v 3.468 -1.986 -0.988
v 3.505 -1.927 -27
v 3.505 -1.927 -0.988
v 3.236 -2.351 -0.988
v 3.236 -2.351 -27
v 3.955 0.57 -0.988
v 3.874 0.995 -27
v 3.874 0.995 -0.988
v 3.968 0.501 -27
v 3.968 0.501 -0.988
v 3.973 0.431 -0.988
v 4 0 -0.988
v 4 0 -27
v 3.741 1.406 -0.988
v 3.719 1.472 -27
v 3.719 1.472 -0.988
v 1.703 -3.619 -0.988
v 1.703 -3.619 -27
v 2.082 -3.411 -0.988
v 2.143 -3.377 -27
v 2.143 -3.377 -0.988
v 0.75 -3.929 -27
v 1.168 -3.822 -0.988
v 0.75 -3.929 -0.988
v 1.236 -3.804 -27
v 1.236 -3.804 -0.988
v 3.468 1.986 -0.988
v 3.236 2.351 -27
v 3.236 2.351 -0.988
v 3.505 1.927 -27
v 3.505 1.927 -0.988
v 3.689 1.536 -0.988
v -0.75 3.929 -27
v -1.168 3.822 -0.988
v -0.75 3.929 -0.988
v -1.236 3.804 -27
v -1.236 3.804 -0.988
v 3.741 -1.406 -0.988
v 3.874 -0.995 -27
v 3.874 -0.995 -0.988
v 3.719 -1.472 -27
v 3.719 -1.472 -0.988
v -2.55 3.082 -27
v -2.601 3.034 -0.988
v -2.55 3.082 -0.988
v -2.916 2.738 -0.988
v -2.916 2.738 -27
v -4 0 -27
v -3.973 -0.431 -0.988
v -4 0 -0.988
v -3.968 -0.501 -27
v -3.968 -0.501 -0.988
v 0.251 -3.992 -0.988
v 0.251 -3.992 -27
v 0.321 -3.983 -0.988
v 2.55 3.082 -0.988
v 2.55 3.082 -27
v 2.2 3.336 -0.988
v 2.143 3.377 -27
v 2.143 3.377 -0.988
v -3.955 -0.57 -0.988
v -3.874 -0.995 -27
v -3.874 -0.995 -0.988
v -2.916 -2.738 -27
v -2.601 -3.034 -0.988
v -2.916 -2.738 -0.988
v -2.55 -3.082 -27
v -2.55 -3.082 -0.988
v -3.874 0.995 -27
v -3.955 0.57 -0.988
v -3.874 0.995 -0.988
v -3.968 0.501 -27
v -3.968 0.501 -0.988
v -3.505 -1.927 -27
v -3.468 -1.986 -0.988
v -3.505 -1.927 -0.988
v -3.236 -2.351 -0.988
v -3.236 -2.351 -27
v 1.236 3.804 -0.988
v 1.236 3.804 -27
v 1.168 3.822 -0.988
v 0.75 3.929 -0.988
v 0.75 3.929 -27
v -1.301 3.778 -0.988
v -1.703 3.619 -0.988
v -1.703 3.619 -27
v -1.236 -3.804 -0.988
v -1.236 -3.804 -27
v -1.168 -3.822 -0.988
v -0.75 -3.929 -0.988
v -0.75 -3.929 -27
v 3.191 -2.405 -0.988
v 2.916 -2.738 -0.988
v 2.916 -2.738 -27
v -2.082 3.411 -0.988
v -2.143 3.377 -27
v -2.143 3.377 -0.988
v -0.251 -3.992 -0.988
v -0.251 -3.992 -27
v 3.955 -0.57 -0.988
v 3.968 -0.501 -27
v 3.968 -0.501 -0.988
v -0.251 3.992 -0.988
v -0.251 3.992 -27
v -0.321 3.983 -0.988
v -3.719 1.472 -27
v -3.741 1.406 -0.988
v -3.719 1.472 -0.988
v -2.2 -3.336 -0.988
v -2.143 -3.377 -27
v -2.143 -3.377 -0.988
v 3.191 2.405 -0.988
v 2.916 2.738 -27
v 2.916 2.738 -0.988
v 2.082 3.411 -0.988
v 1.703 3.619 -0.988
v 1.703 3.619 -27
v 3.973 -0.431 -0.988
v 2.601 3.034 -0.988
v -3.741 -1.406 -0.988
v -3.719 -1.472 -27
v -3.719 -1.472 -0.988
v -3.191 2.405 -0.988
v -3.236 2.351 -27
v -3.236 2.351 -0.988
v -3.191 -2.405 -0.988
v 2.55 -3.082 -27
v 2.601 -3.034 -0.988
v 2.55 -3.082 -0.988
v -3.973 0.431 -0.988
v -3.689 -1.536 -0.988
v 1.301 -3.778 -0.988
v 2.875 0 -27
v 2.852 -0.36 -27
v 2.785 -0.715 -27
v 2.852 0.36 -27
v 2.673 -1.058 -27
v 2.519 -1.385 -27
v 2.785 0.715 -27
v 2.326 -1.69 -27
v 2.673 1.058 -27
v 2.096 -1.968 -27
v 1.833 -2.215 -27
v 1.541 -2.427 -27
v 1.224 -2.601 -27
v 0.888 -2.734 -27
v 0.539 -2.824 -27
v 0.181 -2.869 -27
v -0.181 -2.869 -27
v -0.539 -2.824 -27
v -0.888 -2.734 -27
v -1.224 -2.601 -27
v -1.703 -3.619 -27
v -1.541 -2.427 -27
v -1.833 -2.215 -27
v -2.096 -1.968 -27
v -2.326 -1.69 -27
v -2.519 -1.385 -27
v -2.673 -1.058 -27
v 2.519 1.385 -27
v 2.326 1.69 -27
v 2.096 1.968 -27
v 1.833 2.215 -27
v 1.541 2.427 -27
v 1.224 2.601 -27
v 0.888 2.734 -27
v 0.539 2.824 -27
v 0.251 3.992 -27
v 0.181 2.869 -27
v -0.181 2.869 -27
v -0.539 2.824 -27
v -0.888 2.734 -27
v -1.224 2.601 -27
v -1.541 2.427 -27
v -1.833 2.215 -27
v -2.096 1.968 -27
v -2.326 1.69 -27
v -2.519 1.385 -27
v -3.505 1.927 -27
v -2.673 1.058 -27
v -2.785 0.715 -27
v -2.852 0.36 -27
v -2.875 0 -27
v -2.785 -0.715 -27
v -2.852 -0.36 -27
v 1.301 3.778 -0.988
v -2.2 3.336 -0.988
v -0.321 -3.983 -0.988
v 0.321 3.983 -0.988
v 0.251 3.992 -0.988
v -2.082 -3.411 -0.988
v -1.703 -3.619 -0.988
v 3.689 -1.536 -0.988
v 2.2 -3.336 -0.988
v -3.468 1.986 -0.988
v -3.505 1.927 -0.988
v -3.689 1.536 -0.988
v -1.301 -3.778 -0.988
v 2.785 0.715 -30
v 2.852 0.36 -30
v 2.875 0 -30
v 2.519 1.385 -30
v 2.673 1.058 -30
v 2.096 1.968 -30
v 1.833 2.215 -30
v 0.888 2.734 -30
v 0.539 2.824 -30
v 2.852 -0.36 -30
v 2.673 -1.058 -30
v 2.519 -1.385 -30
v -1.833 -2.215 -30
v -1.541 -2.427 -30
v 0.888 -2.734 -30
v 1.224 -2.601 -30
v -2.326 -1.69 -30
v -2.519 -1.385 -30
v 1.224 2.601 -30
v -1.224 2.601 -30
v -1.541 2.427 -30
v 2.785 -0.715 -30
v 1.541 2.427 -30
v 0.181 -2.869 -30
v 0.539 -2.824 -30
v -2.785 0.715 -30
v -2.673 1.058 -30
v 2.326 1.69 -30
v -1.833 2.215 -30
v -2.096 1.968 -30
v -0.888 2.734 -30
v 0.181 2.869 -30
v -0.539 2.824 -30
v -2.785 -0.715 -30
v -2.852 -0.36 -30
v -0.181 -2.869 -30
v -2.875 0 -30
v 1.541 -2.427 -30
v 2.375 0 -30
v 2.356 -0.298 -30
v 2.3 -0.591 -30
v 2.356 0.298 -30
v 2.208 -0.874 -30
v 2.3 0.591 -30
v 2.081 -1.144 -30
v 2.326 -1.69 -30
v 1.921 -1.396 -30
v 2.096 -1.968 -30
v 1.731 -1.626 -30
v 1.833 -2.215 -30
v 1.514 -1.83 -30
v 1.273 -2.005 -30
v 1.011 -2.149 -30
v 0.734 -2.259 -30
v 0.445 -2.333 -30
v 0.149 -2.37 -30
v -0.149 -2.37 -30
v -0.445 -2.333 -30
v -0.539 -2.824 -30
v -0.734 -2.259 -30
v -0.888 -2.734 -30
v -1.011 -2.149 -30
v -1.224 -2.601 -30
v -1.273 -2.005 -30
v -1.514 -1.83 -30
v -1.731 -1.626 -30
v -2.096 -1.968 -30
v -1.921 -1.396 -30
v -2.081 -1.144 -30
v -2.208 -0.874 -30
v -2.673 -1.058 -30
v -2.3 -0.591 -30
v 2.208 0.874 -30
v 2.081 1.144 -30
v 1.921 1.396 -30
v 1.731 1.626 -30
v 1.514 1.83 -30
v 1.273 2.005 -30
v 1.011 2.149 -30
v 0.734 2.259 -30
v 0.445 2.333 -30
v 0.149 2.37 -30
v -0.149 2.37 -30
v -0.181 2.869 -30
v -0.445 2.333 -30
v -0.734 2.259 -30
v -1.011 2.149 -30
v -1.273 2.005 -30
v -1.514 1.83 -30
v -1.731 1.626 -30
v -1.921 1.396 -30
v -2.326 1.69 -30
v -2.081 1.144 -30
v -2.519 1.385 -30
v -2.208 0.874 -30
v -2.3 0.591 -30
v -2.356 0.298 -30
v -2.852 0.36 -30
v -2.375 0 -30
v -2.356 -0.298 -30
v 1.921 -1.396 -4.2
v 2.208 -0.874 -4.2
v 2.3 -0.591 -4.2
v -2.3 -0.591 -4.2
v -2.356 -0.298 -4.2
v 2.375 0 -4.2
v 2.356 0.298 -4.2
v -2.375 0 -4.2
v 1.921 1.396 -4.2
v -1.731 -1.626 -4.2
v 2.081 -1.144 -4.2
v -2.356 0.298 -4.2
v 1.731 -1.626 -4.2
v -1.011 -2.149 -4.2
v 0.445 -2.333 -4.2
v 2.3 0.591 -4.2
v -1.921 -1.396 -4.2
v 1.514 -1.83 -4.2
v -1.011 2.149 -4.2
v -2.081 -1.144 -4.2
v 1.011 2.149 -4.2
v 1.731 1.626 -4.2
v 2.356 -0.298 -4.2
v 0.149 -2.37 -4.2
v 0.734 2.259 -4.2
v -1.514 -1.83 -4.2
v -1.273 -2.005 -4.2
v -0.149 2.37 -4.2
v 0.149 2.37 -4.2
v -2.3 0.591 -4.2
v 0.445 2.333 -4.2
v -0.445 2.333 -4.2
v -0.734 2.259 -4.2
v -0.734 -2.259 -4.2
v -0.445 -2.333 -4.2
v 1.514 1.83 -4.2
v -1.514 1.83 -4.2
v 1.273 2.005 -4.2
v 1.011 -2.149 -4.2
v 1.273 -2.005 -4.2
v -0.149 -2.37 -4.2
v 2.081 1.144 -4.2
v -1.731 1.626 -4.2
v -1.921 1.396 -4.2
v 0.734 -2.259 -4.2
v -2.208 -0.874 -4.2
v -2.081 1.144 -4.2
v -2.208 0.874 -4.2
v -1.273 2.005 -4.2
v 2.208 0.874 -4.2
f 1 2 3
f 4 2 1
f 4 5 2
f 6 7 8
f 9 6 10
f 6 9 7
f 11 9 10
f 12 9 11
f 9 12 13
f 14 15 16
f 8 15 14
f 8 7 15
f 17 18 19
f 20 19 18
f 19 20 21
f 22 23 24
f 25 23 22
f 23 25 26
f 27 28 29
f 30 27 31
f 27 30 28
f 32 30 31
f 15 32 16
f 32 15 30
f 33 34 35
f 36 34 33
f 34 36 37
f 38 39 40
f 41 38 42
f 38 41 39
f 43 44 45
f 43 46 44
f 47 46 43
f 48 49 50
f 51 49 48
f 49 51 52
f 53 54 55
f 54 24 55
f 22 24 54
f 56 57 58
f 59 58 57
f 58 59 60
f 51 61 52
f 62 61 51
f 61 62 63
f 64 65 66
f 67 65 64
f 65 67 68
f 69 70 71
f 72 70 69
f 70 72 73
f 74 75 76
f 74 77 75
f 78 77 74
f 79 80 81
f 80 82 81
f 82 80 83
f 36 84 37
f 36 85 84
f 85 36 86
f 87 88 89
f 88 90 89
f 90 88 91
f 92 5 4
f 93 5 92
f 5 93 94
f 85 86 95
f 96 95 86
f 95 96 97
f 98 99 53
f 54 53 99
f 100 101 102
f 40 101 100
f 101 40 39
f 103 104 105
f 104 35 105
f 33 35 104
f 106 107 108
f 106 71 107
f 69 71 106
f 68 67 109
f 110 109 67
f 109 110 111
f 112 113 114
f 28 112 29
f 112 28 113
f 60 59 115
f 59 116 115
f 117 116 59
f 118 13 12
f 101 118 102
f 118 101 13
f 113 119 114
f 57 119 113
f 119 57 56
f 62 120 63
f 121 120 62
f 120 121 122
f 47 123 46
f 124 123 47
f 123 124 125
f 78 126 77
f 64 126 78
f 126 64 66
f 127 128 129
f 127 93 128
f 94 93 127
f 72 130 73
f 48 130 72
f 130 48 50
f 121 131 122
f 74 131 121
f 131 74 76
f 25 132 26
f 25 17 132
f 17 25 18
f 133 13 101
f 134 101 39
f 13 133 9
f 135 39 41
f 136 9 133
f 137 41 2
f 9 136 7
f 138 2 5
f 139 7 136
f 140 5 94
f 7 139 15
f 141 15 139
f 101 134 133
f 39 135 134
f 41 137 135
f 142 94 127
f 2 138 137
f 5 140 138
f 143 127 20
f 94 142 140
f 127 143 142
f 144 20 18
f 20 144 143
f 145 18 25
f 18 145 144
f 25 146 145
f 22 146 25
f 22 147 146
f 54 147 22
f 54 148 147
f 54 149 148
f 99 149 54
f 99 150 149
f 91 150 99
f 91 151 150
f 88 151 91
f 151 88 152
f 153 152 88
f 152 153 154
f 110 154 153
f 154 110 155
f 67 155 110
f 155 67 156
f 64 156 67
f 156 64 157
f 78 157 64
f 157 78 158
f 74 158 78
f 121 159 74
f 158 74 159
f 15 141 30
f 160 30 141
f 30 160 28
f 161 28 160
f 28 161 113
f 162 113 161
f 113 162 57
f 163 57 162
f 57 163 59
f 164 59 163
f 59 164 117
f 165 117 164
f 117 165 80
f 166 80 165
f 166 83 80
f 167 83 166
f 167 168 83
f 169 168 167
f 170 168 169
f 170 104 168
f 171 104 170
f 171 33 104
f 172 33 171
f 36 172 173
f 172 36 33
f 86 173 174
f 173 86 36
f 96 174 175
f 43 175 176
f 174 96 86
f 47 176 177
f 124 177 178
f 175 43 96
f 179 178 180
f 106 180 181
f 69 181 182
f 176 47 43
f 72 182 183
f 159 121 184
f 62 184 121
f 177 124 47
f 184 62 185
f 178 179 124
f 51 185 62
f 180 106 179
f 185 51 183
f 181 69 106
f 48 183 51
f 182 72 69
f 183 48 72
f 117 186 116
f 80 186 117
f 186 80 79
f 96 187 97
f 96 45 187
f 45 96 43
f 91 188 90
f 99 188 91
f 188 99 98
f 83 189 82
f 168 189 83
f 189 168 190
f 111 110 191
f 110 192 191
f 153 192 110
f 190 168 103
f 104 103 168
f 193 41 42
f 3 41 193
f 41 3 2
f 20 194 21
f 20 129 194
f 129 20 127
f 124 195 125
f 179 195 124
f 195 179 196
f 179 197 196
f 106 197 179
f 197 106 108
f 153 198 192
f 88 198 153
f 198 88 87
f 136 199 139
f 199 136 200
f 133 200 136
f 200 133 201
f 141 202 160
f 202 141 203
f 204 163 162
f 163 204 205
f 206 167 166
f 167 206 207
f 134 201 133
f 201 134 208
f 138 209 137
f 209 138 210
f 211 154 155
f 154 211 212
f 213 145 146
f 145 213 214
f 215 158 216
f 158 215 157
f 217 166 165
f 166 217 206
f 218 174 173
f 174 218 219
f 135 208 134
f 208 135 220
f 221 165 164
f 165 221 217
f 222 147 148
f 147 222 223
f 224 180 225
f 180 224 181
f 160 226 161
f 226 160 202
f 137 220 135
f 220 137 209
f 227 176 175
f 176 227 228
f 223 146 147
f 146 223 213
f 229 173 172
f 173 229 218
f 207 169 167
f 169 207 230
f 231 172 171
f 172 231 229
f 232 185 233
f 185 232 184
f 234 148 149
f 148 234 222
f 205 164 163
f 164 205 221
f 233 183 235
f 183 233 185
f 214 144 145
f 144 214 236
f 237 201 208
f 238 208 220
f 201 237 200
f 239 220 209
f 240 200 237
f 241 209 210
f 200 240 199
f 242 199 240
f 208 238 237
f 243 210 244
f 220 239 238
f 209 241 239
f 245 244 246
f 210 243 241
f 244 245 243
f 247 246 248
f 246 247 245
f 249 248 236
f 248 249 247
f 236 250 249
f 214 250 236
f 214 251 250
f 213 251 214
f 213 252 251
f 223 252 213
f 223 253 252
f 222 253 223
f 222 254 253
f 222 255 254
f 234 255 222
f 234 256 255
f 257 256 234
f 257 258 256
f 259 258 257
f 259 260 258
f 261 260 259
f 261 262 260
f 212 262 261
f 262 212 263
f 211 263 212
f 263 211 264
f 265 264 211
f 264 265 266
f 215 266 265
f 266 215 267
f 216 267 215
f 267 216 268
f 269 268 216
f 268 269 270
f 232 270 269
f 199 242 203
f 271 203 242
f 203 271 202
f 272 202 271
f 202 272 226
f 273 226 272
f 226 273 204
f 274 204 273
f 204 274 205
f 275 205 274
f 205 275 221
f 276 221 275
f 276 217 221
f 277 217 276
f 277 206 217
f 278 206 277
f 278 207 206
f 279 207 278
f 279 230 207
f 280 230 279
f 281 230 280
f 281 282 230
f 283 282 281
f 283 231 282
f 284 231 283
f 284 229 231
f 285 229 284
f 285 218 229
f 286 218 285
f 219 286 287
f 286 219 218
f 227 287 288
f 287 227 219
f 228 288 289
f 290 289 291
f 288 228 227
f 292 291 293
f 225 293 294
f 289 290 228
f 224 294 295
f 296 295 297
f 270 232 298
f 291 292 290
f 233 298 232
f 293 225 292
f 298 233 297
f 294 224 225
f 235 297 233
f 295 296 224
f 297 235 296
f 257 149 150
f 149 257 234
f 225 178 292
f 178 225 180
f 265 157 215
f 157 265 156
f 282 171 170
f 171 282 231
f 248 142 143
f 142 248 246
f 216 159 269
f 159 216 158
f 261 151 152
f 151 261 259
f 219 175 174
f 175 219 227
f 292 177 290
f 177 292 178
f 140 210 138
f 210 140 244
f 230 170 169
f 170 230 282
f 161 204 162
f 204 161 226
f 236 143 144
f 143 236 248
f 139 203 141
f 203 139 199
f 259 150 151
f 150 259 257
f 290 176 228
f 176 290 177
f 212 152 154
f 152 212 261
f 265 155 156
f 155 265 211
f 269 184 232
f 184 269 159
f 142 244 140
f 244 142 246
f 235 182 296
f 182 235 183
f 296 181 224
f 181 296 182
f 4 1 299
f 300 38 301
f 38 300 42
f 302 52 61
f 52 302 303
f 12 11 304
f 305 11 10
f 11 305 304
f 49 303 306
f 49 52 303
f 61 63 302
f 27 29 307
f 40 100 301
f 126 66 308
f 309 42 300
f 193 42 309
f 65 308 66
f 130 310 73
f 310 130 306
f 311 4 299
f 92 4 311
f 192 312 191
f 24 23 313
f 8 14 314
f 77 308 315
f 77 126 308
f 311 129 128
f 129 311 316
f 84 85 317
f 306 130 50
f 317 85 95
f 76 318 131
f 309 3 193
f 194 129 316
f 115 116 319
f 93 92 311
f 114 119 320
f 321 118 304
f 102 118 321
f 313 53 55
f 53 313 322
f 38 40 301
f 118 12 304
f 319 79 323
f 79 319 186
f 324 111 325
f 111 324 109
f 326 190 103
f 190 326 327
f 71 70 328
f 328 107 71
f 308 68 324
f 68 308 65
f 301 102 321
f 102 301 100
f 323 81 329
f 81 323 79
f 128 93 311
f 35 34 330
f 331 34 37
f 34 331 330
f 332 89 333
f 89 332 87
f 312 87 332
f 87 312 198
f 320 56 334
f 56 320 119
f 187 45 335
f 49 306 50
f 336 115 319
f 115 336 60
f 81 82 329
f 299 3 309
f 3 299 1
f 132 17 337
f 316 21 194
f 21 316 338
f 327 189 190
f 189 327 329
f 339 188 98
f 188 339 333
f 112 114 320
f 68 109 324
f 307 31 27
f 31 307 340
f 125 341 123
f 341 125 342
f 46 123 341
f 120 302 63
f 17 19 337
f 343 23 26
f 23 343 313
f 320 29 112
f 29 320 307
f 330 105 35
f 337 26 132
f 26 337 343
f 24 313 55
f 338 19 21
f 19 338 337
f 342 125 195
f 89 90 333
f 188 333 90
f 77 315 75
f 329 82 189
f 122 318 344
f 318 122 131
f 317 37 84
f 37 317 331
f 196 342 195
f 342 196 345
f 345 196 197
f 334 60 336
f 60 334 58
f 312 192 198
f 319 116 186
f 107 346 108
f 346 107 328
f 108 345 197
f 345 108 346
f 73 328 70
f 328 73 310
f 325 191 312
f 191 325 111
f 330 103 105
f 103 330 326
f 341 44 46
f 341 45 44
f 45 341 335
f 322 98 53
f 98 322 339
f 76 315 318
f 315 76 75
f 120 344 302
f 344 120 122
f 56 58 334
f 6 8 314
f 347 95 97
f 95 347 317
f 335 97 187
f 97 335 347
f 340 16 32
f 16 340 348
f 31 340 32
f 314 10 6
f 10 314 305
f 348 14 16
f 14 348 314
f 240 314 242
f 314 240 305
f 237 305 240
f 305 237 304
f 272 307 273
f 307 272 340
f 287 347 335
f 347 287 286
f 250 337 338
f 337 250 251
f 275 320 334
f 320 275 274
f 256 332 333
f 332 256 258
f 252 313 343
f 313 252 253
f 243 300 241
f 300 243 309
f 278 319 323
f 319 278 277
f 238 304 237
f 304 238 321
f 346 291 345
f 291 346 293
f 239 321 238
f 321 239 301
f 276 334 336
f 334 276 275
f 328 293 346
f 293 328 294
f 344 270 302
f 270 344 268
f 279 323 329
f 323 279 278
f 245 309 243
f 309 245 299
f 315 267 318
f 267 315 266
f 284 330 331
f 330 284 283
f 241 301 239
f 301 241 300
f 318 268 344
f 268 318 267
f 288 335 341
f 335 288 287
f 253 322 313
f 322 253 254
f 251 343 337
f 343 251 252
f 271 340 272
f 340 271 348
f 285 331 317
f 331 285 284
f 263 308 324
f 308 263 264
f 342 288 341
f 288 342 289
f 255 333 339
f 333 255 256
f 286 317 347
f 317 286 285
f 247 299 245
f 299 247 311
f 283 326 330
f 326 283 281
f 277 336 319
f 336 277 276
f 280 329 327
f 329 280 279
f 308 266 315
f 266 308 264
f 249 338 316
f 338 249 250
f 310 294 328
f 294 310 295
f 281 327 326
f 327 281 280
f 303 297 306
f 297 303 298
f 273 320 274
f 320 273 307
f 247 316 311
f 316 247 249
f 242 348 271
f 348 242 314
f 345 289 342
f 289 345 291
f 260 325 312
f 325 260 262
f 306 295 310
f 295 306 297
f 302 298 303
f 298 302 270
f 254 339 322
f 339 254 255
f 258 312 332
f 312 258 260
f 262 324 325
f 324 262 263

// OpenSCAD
$fn = 50;

difference() {
	union() {
		translate(v = [0, 0, -27.0]) {
			cylinder(h = 30, r = 4.0);
		}
		#translate(v = [0, 0, -30.0]) {
			cylinder(h = 30, r = 2.875);
		}
	}
	union() {
		translate(v = [0, 0, 0]) {
			rotate(a = [0, 0, 0]) {
				difference() {
					union() {
						translate(v = [0, 0, -30.0]) {
							cylinder(h = 30, r = 2.25);
						}
						translate(v = [0, 0, -4.2]) {
							cylinder(h = 4.2, r1 = 2.375, r2 = 4.5);
						}
						translate(v = [0, 0, -30.0]) {
							cylinder(h = 30, r = 2.375);
						}
						translate(v = [0, 0, -30.0]) {
							cylinder(h = 30, r = 2.25);
						}
					}
					union();
				}
			}
		}
		#cylinder(h = 3, r = 5.0);
	}
}
